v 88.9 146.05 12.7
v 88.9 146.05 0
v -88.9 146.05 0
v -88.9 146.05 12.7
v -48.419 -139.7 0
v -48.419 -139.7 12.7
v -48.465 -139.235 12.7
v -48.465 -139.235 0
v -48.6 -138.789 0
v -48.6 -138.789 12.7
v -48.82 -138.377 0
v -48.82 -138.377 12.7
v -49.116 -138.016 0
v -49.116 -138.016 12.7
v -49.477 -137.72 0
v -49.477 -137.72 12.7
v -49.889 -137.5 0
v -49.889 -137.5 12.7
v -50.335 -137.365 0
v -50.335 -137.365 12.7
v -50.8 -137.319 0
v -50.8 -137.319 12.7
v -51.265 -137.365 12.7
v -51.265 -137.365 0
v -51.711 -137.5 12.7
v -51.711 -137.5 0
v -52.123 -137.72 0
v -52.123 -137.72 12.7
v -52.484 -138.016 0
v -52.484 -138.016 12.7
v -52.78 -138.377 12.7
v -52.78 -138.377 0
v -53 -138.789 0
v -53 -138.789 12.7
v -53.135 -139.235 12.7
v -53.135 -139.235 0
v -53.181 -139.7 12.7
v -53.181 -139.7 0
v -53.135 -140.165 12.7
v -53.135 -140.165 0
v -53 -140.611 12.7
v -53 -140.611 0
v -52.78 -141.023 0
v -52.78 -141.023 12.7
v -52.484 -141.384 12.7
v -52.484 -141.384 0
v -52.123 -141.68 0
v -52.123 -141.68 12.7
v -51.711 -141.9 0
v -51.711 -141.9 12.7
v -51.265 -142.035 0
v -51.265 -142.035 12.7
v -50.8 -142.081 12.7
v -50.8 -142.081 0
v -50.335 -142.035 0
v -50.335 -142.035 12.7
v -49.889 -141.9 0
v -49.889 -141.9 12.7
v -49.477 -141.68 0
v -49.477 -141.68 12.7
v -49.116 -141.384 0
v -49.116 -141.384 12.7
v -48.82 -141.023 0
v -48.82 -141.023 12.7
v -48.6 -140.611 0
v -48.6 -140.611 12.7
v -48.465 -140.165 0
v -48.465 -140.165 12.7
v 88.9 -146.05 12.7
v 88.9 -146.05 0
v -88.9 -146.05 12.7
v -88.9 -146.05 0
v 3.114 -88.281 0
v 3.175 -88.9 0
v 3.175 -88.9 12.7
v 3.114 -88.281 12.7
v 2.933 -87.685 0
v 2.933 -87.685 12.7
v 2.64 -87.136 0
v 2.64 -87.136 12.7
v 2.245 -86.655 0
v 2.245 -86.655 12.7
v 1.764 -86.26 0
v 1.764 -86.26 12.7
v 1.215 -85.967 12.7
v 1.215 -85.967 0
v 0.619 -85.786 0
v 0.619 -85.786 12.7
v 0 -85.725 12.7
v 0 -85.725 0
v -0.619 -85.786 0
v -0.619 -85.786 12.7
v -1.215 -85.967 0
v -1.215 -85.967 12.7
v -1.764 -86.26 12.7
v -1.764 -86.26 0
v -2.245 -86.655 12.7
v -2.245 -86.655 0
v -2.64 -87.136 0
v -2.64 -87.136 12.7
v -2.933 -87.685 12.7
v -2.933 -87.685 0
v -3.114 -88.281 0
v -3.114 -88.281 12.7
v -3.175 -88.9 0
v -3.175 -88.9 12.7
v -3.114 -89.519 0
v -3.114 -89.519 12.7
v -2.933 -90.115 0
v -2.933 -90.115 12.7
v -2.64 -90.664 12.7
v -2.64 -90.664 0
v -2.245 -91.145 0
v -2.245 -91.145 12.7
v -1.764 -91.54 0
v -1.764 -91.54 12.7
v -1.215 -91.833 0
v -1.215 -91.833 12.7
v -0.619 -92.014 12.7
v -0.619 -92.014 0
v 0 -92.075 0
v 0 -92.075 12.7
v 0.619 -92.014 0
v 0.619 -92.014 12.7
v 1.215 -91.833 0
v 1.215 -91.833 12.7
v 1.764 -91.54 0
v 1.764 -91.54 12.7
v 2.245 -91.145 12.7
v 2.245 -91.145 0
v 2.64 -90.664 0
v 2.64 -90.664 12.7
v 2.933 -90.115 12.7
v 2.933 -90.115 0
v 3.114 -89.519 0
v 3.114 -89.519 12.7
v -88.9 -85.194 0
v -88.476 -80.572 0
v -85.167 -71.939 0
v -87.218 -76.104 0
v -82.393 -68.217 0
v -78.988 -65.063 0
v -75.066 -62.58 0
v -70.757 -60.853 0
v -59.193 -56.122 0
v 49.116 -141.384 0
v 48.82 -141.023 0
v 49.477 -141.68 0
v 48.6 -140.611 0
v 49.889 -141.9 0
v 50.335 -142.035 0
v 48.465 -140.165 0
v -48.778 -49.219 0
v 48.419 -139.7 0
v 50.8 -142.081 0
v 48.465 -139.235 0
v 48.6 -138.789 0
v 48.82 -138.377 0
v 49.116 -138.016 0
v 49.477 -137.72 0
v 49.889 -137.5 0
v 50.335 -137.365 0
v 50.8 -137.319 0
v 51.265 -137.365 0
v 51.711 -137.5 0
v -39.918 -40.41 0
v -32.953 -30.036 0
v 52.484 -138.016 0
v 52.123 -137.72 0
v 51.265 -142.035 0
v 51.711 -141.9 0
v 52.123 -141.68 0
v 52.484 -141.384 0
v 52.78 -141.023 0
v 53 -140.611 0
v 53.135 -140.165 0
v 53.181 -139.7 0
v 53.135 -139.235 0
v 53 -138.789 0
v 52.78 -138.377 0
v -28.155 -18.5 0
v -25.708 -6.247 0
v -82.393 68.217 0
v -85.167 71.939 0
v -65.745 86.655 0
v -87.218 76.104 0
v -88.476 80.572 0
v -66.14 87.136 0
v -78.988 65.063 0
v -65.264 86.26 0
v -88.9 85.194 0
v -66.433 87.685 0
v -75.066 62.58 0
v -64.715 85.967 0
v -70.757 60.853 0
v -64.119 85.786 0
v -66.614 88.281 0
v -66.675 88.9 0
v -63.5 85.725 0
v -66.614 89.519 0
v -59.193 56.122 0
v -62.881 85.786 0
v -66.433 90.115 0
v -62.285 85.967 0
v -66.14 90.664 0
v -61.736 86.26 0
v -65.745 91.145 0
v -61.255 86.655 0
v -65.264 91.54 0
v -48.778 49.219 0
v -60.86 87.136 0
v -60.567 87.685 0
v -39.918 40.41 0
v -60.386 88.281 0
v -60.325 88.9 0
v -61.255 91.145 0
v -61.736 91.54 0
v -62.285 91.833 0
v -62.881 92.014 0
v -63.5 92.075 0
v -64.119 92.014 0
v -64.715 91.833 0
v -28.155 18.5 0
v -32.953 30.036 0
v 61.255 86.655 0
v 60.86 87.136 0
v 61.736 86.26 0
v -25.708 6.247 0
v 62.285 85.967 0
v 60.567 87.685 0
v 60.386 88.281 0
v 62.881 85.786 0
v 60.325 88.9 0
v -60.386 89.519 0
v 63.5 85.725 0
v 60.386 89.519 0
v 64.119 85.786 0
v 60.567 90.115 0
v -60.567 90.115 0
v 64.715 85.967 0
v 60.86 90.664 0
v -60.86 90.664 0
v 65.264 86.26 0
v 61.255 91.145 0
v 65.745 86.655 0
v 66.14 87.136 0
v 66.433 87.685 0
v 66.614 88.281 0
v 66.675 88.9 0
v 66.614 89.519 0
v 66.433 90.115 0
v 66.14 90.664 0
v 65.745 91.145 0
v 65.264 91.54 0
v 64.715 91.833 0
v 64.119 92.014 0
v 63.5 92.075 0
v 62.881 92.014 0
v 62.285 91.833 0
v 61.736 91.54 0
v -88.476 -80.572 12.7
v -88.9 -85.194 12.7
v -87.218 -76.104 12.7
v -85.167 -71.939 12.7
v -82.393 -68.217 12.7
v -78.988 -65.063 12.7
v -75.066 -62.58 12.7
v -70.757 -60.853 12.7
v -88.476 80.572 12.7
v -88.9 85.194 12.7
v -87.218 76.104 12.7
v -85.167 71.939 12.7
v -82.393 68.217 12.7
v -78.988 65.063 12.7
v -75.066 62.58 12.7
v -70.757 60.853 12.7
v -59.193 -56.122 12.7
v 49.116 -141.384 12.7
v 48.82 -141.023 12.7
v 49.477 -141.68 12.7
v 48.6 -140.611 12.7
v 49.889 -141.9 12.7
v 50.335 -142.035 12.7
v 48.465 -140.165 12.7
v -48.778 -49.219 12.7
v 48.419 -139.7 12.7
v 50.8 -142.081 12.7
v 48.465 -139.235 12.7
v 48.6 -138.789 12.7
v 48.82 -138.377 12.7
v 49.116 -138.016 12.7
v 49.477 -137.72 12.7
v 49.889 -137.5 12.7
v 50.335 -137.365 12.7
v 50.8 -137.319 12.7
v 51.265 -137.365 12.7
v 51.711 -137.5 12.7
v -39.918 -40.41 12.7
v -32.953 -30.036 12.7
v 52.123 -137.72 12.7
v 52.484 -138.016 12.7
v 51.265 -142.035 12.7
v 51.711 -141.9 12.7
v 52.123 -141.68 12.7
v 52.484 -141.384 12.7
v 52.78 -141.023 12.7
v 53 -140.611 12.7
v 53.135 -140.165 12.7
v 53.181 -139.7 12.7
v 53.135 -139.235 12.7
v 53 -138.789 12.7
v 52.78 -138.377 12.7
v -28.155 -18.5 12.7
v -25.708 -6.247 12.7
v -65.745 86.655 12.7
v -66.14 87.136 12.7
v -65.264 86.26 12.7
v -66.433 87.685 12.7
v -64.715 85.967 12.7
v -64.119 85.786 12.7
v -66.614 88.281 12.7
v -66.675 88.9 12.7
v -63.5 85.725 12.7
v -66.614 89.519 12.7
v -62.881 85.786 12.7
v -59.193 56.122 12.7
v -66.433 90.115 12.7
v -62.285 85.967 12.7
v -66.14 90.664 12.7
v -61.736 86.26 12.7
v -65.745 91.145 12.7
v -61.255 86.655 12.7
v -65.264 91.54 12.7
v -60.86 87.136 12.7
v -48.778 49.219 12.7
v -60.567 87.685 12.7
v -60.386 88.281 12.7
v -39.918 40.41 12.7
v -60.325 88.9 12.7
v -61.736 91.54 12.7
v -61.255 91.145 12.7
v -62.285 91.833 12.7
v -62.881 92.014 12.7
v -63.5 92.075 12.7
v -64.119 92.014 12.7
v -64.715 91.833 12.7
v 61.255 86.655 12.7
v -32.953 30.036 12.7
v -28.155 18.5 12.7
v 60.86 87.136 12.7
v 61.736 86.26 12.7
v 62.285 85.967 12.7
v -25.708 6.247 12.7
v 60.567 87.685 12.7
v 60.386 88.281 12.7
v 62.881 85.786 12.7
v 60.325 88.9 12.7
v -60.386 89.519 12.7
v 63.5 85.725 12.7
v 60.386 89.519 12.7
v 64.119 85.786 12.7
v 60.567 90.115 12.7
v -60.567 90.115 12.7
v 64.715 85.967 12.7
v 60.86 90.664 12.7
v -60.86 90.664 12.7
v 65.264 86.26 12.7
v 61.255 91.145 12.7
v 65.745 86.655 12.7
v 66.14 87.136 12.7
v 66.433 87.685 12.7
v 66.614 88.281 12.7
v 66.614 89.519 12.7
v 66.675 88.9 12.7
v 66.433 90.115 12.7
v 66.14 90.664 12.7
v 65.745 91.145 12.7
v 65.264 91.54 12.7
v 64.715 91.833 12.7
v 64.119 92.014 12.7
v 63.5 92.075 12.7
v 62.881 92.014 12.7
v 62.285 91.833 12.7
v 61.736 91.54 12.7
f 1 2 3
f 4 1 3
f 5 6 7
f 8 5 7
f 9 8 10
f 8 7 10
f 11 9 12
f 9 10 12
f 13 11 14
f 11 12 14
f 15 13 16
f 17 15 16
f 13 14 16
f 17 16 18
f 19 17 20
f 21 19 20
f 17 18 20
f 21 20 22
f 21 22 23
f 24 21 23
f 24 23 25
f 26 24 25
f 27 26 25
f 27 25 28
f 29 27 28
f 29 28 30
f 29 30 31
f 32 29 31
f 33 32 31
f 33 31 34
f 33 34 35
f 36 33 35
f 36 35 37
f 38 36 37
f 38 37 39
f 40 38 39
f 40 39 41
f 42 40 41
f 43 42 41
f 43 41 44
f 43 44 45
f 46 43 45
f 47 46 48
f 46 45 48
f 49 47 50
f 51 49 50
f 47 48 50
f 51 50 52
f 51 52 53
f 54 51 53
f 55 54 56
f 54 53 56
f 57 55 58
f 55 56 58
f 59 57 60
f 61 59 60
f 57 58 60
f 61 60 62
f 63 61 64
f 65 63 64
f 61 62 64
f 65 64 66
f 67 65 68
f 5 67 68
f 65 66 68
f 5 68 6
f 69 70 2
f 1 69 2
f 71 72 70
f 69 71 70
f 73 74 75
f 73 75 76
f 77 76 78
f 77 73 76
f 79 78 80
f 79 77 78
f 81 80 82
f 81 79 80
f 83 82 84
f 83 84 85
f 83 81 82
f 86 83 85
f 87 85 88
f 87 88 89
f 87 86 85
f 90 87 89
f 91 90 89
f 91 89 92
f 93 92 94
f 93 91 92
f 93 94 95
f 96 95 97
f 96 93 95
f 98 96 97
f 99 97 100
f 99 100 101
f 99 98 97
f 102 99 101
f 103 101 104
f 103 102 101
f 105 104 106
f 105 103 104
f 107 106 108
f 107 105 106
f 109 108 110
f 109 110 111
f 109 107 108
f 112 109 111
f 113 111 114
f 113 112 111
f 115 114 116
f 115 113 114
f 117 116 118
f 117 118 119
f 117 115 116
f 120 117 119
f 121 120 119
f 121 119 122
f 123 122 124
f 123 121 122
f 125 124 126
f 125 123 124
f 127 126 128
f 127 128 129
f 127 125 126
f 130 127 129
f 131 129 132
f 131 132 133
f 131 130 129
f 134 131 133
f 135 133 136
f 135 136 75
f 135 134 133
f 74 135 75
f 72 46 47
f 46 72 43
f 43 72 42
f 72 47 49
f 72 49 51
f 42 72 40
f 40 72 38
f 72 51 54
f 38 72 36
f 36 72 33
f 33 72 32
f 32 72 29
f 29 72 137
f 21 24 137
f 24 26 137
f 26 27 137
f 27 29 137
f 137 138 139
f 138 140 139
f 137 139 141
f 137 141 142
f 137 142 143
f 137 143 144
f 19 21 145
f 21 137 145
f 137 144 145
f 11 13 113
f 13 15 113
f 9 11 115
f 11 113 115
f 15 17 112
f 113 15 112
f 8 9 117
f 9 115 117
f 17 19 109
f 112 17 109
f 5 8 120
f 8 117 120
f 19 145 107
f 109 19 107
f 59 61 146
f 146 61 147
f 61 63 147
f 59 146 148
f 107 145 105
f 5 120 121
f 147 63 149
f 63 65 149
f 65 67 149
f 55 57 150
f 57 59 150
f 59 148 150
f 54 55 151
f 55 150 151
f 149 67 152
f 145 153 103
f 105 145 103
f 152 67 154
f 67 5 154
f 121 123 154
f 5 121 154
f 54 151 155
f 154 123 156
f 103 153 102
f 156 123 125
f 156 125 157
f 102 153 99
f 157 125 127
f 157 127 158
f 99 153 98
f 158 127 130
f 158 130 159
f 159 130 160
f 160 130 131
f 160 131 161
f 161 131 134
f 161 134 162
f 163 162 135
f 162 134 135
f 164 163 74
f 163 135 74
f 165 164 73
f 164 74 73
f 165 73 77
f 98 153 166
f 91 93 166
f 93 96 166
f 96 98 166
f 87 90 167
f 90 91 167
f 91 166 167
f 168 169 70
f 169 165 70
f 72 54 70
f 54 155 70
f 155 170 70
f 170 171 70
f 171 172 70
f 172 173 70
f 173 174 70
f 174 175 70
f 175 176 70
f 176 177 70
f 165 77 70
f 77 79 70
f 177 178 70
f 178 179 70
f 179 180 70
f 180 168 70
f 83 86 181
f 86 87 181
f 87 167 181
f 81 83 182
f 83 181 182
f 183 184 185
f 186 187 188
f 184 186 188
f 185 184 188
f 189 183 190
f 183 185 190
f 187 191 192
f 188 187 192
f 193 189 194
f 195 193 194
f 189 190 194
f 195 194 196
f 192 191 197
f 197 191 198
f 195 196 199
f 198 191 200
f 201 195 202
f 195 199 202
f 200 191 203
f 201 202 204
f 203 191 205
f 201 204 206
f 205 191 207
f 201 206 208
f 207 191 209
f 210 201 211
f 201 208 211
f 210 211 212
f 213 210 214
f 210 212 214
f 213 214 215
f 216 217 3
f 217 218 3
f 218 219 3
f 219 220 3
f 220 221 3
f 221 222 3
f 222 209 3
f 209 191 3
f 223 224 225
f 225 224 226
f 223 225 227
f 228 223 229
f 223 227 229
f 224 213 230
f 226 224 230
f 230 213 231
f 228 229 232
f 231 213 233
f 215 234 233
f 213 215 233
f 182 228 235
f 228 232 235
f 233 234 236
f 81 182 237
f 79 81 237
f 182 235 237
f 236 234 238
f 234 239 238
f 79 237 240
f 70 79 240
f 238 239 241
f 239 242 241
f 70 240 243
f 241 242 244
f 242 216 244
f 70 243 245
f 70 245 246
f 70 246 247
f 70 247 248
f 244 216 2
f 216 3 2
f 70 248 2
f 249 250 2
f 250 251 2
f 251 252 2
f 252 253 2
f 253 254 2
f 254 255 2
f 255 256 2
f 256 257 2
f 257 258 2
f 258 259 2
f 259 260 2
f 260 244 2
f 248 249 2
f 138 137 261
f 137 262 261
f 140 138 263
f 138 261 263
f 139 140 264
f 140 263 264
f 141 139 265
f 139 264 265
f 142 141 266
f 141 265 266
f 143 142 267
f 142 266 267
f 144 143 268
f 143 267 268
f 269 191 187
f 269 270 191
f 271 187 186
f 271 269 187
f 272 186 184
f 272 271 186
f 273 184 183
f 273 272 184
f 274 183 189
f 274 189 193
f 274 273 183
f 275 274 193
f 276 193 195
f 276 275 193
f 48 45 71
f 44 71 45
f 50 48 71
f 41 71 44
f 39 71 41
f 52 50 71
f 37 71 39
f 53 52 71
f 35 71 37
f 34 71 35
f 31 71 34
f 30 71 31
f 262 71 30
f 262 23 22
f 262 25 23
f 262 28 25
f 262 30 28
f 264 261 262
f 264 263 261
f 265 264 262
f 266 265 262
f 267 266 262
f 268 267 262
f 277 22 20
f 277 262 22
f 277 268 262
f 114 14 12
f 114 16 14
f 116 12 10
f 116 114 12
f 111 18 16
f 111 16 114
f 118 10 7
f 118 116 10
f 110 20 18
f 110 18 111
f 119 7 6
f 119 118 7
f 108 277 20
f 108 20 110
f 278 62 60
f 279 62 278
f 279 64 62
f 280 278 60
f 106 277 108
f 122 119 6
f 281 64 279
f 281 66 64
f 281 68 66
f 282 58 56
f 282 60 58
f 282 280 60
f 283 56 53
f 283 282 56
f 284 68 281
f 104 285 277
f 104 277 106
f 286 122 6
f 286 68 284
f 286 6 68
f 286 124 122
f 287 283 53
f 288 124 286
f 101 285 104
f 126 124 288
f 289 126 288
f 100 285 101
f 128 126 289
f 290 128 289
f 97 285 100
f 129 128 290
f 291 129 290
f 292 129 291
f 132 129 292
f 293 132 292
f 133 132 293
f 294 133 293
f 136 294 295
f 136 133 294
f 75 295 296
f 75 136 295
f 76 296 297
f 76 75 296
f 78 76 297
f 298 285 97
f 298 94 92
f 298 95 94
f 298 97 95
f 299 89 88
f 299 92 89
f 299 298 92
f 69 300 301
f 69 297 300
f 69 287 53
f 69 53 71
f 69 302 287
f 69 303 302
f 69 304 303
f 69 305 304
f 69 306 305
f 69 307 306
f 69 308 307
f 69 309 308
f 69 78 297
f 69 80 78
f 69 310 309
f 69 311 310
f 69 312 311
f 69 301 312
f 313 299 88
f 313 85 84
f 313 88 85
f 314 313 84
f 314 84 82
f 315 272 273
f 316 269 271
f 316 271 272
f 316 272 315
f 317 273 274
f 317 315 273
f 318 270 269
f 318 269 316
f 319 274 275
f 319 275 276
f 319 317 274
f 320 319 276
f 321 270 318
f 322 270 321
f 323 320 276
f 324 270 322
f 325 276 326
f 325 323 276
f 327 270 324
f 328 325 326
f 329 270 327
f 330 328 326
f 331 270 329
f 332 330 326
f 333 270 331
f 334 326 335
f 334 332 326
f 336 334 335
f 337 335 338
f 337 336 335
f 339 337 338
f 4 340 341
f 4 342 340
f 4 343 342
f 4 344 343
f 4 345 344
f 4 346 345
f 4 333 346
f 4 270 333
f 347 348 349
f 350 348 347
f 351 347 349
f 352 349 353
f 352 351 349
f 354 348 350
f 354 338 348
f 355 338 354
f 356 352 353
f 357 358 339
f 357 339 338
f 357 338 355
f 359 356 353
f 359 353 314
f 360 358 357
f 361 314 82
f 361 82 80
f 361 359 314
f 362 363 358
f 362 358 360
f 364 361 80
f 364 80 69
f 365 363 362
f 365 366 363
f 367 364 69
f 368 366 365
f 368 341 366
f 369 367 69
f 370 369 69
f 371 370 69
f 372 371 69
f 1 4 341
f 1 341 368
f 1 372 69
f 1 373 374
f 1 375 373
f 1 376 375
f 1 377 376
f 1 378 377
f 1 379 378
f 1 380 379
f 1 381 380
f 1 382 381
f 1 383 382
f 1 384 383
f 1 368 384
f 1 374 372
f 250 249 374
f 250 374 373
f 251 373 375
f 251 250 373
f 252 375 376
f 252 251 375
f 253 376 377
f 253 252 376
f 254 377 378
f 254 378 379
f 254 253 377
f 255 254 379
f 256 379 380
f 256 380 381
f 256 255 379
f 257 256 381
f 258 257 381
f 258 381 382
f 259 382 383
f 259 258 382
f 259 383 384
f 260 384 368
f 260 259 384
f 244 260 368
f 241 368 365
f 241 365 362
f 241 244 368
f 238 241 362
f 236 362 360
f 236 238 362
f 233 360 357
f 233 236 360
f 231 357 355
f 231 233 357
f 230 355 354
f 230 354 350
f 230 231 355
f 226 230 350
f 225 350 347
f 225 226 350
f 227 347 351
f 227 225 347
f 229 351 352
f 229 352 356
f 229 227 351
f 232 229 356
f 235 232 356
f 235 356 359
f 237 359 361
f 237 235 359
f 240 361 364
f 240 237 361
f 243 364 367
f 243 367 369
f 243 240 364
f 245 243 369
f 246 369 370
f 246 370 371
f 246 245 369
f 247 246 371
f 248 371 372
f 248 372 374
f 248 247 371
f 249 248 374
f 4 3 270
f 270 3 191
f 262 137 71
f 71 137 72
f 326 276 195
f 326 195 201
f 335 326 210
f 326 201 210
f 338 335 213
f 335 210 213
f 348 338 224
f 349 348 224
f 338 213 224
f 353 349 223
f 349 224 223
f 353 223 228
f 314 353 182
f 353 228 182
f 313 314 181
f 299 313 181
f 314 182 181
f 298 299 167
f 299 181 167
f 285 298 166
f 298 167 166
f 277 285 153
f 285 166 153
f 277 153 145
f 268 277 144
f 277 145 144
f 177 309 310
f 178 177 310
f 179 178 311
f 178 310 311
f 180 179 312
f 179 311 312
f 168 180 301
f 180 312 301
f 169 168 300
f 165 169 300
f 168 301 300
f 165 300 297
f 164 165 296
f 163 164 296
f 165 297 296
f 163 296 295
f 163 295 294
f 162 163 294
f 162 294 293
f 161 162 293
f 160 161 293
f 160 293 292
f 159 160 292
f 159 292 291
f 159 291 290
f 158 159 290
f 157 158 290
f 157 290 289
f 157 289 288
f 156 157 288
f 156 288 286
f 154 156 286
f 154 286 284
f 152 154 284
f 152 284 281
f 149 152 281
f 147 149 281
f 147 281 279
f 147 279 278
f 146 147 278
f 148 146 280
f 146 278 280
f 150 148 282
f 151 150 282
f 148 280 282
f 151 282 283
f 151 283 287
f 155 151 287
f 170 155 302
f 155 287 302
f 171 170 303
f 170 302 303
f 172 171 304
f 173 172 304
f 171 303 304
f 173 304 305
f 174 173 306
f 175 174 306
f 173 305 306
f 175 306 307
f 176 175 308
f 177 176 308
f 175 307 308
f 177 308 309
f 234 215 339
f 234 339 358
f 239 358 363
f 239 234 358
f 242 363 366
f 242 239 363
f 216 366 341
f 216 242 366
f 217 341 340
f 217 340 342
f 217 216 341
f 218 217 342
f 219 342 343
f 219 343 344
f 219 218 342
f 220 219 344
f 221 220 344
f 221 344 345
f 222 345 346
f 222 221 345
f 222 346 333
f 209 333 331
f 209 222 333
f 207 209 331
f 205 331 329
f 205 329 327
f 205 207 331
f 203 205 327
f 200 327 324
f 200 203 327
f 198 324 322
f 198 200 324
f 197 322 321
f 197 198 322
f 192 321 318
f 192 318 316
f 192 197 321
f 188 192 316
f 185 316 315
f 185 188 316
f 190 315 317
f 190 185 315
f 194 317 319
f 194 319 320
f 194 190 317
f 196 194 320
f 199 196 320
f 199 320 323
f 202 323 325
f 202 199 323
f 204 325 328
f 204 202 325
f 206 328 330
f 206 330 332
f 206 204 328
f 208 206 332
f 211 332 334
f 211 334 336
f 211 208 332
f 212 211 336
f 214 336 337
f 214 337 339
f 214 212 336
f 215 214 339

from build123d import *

# Parameters (mm, degrees)
F0_R     = 3.175
F1_DEPTH = 12.7
F2_R     = 25.4
F3_R     = 2.38125
F4_DEPTH = 12.701


with BuildPart() as f1:
    # F0 (on Top) → F1 (new body)
    with BuildSketch(Plane.XY):
        with BuildLine():
            Line((88.9, -146.05), (88.9, 146.05))
            Line((88.9, 146.05), (-88.9, 146.05))
            Line((-88.9, 146.05), (-88.9, 63.5))
            ThreePointArc((-88.9, 63.5), (-25.4, 0), (-88.9, -63.5))
            Line((-88.9, -63.5), (-88.9, -146.05))
            Line((-88.9, -146.05), (88.9, -146.05))
        make_face()
        with Locations((0, -88.9)):
            Circle(F0_R, mode=Mode.SUBTRACT)
        with Locations((-63.5, 88.9)):
            Circle(F0_R, mode=Mode.SUBTRACT)
        with Locations((63.5, 88.9)):
            Circle(F0_R, mode=Mode.SUBTRACT)
    extrude(amount=F1_DEPTH)

    # F2
    f2_edges = [f1.edges().sort_by_distance(p)[0] for p in [
        (-88.9, -63.5, 6.35),
        (-88.9, 63.5, 6.35),
    ]]
    fillet(f2_edges, radius=F2_R)

    # F3 (on face) → F4 (cut, through all)
    with BuildSketch(Plane.XY.offset(12.7)):
        with Locations((-50.8, -139.7)):
            Circle(F3_R)
        with Locations((50.8, -139.7)):
            Circle(F3_R)
    extrude(amount=-F4_DEPTH, mode=Mode.SUBTRACT)


solid = f1.part
